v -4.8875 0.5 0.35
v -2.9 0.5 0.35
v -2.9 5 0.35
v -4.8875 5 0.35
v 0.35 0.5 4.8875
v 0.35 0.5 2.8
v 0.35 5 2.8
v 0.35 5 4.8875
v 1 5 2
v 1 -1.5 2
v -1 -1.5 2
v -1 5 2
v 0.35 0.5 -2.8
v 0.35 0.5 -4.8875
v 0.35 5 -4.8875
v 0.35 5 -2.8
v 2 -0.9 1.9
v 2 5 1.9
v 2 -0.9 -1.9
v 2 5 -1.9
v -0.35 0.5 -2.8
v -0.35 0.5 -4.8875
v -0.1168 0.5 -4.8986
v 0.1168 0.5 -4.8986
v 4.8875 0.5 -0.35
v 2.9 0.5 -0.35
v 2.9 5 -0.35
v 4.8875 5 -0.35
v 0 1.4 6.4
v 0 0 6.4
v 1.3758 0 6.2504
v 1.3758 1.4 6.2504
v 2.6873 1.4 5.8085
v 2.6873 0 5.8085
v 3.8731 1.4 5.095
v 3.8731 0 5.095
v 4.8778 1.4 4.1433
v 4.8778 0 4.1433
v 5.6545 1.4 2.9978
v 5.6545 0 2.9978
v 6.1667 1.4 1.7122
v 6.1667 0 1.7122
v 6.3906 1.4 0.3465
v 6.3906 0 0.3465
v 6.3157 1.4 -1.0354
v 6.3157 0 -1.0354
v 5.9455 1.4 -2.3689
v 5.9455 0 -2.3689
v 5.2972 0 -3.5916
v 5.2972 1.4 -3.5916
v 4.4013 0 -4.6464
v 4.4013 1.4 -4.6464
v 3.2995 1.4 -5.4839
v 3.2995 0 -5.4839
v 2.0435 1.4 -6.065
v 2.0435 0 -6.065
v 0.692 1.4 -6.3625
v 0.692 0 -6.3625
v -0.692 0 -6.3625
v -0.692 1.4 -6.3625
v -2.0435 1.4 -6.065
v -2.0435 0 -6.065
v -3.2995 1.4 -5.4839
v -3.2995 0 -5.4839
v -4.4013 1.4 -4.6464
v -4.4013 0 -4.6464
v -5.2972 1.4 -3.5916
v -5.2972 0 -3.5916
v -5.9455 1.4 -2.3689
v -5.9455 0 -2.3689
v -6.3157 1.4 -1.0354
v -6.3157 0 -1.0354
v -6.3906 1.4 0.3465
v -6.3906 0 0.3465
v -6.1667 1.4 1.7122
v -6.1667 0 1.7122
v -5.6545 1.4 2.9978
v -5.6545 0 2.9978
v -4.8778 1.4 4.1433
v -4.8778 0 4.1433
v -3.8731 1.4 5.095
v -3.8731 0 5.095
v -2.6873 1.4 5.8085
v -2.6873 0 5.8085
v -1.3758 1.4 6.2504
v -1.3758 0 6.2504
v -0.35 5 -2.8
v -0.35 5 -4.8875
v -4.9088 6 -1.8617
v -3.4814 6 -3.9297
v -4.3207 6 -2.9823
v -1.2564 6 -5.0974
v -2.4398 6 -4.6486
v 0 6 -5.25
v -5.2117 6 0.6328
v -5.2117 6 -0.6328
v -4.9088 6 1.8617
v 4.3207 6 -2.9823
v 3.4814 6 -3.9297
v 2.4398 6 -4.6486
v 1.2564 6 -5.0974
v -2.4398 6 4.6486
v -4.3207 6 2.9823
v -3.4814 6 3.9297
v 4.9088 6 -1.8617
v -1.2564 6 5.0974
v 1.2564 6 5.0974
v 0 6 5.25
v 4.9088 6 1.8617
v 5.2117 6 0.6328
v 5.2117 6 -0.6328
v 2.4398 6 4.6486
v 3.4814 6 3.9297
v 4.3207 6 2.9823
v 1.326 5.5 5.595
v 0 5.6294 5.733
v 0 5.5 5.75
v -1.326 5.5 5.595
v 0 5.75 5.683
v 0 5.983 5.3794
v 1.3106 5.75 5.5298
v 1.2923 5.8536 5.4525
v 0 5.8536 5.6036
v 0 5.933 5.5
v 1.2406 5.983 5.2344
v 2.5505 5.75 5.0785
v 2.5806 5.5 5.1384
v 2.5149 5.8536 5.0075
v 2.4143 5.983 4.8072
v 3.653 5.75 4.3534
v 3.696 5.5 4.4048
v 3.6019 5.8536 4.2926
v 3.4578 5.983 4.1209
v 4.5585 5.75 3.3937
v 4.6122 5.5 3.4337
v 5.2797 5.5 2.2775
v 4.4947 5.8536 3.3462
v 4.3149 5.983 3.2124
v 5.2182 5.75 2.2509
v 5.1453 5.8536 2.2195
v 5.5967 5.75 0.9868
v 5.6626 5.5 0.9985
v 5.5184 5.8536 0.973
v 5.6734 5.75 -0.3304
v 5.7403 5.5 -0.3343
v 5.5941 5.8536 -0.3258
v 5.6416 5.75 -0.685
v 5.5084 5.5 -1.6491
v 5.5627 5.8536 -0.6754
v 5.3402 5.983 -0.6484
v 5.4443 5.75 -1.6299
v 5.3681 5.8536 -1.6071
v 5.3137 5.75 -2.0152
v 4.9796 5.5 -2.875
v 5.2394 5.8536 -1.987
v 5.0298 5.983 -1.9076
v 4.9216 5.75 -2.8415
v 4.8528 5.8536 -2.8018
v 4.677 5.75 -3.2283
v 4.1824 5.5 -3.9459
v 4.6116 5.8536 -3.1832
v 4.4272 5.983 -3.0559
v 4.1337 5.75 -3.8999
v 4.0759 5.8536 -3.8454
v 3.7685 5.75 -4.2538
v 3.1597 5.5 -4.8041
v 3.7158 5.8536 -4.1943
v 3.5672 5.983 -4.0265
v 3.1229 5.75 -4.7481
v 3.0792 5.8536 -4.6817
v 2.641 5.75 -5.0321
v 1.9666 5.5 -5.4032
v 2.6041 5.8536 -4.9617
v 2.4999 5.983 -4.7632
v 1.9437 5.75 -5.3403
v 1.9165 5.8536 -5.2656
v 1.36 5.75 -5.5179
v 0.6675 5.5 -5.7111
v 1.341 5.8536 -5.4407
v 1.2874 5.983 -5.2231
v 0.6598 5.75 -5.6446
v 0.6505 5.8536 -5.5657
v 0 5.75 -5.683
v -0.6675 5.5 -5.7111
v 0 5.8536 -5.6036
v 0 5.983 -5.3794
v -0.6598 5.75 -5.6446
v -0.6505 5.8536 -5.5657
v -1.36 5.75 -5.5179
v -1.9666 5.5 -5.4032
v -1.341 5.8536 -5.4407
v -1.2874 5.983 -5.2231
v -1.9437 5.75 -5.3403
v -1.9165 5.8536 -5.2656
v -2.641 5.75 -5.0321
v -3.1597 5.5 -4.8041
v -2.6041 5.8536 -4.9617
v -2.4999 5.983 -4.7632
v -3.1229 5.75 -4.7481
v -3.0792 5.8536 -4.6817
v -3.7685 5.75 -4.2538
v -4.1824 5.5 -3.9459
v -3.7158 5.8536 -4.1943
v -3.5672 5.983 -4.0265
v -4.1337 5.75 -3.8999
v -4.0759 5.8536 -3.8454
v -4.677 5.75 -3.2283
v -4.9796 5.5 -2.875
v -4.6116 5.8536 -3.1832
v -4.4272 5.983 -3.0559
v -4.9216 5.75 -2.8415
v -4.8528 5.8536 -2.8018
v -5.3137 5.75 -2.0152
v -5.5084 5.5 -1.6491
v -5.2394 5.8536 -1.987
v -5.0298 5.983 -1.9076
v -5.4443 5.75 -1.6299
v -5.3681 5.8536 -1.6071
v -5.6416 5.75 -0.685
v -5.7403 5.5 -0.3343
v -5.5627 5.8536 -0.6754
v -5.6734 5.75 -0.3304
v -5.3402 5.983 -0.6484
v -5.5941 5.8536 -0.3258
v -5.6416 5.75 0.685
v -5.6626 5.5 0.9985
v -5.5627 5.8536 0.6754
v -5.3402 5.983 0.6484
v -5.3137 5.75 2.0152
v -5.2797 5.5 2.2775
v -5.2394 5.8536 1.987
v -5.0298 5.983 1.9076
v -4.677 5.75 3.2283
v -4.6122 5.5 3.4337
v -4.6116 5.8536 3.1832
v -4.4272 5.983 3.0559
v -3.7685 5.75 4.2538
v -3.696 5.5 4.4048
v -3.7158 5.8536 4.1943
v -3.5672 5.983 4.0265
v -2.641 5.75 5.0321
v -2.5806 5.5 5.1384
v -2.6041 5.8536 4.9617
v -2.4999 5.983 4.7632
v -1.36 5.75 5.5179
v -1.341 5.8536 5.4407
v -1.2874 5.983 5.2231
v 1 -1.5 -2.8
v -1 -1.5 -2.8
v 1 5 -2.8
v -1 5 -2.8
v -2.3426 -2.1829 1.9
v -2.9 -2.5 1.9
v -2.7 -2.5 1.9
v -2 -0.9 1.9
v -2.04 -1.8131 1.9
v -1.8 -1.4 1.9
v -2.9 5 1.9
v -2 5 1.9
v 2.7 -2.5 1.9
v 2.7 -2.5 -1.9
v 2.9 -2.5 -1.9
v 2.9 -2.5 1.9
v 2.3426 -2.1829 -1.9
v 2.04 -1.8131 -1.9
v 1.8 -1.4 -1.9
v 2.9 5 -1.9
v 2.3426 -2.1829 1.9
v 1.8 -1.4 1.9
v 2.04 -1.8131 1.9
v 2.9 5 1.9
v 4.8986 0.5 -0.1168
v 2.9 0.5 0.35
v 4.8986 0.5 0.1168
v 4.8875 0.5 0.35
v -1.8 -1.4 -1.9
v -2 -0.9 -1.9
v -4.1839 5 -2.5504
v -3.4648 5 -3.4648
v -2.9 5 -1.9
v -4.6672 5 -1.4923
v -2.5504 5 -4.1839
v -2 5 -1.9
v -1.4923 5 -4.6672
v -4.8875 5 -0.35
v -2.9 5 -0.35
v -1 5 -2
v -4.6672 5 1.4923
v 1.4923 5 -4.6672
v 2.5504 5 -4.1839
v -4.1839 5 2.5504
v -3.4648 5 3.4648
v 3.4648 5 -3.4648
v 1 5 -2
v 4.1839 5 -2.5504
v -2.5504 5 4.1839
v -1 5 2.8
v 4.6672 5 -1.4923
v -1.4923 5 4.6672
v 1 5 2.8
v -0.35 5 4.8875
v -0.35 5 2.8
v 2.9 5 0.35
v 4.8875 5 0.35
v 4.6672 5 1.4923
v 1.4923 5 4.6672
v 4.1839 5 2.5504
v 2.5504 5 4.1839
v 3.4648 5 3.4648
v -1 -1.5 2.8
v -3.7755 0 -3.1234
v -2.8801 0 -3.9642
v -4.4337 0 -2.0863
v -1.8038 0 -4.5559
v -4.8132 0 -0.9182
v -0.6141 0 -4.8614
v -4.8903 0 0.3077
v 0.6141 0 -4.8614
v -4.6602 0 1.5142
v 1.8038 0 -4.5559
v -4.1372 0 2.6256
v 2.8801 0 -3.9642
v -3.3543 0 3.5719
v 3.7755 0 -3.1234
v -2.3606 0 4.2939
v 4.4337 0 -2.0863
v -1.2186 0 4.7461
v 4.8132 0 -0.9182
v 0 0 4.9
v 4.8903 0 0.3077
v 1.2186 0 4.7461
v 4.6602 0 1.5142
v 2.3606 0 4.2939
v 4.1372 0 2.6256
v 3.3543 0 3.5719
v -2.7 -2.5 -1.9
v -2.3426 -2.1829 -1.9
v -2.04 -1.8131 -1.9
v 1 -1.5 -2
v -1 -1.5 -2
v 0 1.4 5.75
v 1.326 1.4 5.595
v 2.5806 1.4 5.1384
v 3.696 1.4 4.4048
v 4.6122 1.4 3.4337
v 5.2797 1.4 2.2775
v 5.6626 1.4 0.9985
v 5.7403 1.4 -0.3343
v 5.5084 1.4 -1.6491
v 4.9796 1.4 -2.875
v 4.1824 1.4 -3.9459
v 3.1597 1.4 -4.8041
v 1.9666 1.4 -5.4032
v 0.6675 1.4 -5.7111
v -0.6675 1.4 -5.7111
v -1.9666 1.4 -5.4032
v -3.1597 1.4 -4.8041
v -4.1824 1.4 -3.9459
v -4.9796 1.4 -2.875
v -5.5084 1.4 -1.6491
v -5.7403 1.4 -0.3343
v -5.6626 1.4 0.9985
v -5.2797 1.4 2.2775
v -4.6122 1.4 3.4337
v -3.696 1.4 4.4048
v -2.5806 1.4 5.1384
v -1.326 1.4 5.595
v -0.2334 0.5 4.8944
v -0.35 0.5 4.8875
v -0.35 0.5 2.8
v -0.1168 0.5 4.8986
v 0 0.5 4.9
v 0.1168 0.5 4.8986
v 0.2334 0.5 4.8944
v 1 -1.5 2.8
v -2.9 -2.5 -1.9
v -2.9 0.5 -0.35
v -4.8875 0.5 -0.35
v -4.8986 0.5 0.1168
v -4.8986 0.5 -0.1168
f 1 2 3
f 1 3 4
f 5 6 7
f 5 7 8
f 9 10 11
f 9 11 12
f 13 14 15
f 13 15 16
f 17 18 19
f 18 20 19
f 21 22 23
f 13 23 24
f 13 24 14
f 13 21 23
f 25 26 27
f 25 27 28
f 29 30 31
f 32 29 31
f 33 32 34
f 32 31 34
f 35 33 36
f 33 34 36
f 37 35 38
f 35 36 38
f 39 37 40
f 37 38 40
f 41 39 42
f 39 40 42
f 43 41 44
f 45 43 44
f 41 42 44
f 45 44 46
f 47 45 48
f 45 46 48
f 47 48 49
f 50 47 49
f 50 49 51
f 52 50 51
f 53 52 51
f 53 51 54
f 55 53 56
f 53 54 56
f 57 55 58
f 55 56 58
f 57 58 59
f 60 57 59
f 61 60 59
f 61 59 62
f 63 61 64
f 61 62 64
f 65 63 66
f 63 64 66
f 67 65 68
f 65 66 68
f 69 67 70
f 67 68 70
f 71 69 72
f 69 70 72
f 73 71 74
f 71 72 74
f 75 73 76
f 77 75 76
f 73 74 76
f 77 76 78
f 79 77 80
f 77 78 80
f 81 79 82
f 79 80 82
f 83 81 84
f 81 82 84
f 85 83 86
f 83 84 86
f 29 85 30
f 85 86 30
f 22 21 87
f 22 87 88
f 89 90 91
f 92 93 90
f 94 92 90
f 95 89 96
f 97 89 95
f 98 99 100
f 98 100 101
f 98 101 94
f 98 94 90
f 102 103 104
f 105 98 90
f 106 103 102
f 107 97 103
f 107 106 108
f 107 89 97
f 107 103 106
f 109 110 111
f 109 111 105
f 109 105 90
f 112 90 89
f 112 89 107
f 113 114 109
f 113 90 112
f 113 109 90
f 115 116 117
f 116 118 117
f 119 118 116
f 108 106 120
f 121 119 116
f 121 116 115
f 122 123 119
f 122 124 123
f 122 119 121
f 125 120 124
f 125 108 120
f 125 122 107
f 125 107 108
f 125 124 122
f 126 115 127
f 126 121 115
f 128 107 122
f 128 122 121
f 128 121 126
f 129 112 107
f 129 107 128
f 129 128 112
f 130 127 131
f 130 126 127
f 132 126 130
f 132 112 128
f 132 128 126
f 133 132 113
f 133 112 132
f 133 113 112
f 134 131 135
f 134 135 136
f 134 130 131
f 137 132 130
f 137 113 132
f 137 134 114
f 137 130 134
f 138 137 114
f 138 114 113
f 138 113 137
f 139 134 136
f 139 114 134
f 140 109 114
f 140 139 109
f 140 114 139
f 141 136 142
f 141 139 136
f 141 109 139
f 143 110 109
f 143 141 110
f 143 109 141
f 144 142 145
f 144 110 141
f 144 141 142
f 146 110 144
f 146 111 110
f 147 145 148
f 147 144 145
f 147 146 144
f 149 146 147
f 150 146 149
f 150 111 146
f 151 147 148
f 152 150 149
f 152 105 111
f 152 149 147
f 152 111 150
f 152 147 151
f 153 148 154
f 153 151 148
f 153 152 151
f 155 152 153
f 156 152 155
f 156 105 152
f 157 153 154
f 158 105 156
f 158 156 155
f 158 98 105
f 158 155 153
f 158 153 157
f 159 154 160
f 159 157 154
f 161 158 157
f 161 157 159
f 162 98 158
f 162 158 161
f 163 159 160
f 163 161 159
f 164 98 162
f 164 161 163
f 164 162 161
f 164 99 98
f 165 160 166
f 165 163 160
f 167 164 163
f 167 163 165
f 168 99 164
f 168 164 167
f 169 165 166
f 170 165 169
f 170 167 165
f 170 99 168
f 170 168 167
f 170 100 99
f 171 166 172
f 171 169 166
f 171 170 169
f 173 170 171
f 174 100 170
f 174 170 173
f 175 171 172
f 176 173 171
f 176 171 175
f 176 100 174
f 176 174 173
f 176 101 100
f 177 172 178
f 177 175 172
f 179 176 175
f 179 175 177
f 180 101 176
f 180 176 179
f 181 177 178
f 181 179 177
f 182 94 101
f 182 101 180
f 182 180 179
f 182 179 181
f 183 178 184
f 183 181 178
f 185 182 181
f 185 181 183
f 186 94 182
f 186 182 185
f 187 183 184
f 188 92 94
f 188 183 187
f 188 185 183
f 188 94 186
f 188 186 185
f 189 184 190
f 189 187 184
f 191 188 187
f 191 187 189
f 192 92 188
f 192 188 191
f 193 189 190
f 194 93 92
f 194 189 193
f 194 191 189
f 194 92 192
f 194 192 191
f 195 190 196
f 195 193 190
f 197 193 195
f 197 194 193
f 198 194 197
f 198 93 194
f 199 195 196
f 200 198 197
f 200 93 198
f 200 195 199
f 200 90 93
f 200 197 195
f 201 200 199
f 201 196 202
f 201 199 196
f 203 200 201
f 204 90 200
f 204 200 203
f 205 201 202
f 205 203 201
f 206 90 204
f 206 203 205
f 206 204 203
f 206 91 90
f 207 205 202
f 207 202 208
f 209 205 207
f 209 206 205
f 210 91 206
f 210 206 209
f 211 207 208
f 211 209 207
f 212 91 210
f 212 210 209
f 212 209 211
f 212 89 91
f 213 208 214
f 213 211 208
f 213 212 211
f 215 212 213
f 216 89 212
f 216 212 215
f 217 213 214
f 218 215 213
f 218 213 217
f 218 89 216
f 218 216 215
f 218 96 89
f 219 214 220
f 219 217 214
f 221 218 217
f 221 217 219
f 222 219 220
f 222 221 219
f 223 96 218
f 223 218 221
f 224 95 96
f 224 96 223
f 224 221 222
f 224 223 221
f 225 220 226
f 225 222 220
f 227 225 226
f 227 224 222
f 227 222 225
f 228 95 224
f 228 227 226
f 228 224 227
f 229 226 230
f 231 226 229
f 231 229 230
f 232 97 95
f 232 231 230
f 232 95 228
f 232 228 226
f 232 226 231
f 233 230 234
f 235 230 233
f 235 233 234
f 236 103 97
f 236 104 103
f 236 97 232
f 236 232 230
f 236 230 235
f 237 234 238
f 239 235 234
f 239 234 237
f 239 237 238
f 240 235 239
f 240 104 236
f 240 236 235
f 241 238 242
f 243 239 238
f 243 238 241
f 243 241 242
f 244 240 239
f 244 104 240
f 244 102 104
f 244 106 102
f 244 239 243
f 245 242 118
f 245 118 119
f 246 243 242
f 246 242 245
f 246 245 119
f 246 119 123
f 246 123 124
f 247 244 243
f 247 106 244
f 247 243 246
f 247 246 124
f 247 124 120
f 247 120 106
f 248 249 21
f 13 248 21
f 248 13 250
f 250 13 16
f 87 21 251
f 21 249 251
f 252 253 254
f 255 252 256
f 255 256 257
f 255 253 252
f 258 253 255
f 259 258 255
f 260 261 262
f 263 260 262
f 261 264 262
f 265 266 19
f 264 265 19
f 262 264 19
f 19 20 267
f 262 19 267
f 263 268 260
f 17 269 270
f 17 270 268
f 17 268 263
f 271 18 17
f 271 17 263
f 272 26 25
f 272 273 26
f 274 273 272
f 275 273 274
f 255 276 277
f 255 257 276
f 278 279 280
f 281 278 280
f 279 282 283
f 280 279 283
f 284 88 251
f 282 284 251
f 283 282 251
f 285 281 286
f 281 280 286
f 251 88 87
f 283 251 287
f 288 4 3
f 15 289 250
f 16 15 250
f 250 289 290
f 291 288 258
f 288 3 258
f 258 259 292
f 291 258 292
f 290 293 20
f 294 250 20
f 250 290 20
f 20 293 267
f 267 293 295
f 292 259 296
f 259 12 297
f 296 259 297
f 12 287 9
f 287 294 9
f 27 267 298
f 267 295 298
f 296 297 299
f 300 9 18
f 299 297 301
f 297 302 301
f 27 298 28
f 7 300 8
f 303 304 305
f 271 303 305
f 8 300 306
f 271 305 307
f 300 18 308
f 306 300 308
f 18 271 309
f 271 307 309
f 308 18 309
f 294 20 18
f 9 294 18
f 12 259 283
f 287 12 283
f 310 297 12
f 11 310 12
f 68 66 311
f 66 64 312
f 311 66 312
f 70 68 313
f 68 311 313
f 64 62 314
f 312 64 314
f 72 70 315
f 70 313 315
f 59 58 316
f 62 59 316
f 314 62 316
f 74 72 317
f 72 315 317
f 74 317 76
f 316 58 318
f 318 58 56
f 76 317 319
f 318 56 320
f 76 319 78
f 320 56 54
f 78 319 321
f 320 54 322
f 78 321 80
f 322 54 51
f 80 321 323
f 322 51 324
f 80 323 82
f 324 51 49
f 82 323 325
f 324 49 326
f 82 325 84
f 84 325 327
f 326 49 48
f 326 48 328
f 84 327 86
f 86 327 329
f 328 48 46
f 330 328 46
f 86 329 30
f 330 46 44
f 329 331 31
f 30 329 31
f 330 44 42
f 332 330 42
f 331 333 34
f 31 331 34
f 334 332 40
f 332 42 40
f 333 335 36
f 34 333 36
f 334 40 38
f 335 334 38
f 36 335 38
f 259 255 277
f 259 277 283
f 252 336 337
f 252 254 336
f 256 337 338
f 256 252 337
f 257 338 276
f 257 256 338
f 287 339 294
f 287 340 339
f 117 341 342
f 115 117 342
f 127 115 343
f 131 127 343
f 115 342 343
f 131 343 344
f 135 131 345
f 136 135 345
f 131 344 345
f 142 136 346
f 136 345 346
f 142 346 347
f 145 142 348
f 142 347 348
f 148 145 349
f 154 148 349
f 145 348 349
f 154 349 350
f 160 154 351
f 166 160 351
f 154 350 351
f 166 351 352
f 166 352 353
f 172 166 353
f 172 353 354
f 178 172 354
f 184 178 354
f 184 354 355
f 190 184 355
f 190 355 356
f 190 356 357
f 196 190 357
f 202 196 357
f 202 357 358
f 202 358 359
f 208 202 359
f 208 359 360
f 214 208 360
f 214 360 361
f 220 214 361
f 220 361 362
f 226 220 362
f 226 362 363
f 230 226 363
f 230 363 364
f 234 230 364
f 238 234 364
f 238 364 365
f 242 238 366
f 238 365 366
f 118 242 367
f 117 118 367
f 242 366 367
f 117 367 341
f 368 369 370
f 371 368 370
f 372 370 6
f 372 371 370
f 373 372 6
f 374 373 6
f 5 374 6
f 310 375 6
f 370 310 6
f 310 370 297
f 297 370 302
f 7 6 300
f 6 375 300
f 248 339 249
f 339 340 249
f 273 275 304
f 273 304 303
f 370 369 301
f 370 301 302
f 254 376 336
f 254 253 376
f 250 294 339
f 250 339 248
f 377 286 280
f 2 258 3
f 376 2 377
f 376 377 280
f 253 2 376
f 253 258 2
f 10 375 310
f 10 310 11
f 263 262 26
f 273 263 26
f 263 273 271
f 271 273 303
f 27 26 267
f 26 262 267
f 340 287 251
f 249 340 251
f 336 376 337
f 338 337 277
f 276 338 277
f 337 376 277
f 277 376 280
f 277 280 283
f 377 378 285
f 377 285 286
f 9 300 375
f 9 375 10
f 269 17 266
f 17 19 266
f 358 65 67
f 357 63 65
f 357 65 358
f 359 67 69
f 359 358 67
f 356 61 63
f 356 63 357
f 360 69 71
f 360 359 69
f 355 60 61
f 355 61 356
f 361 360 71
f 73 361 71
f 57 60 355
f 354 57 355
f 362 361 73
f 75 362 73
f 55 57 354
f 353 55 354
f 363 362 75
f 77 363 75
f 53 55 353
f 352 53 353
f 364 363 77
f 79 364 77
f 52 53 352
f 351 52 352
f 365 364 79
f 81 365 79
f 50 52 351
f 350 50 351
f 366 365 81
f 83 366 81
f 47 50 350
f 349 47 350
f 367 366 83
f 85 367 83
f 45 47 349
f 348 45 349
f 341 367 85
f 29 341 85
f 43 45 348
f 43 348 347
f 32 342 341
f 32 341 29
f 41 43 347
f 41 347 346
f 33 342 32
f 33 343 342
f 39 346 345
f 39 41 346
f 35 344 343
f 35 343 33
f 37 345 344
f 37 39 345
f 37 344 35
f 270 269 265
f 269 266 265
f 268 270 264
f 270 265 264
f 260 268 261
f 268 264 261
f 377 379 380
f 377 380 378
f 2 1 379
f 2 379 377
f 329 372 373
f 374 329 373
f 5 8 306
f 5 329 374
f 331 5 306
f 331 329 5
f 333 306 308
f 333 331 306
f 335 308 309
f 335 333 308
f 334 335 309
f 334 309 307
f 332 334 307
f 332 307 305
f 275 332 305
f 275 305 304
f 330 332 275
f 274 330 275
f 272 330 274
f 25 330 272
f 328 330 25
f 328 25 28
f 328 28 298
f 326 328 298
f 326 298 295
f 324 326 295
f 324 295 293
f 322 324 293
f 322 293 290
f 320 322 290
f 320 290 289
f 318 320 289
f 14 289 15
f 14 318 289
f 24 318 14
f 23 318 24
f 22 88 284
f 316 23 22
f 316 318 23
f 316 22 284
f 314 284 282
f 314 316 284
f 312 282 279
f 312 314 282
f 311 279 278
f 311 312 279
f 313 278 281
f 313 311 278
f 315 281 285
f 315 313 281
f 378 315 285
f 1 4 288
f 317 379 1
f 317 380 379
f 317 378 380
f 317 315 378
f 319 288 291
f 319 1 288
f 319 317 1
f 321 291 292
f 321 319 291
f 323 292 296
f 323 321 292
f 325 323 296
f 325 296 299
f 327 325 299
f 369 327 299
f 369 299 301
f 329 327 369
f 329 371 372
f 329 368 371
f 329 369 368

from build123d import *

# Parameters (mm, degrees)
SKETCH1_R           = 5.75
BOSS_EXTRUDE1_DEPTH = 6
SKETCH2_R           = 6.4
BOSS_EXTRUDE2_DEPTH = 1.4
SKETCH3_R           = 4.9
CUT_EXTRUDE1_DEPTH  = 5
SKETCH4_W           = 0.8
SKETCH4_H           = 6.5
BOSS_EXTRUDE3_DEPTH = 1
BOSS_EXTRUDE4_DEPTH = 1.9
BOSS_EXTRUDE5_START = 4.5
BOSS_EXTRUDE5_DEPTH = 4.5
FILLET1_R           = 0.5


with BuildPart() as part:
    # Sketch1 → Boss-Extrude1 (new body)
    with BuildSketch(Plane(origin=(0, 0, 0), x_dir=(1, 0, 0), z_dir=(0, 1, 0))):
        with Locations(Location((0, 0, 0), (0, 0, 270))):
            Circle(SKETCH1_R)
    extrude(amount=BOSS_EXTRUDE1_DEPTH)

    # Sketch2 → Boss-Extrude2 (add)
    with BuildSketch(Plane(origin=(0, 0, 0), x_dir=(1, 0, 0), z_dir=(0, 1, 0))):
        with Locations(Location((0, 0, 0), (0, 0, 270))):
            Circle(SKETCH2_R)
    extrude(amount=BOSS_EXTRUDE2_DEPTH)

    # Sketch3 → Cut-Extrude1 (cut)
    with BuildSketch(Plane(origin=(0, 0, 0), x_dir=(1, 0, 0), z_dir=(0, 1, 0))):
        with Locations(Location((0, 0, 0), (0, 0, 270))):
            Circle(SKETCH3_R)
    extrude(amount=CUT_EXTRUDE1_DEPTH, mode=Mode.SUBTRACT)

    # Sketch4 → Boss-Extrude3 (add, symmetric)
    with BuildSketch(Plane(origin=(0, 0, 0), x_dir=(0, 0, -1), z_dir=(1, 0, 0))):
        with Locations((2.4, 1.75)):
            Rectangle(SKETCH4_W, SKETCH4_H)
        with Locations((-2.4, 1.75)):
            Rectangle(SKETCH4_W, SKETCH4_H)
    extrude(amount=BOSS_EXTRUDE3_DEPTH, both=True)

    # Sketch5 → Boss-Extrude4 (add, symmetric)
    with BuildSketch(Plane.XY):
        with BuildLine():
            Line((2.9, 5), (2, 5))
            Line((2, 5), (2, -0.9))
            Line((2, -0.9), (1.8, -1.4))
            ThreePointArc((1.8, -1.4), (2.183918232, -2.004066901), (2.7, -2.5))
            Line((2.7, -2.5), (2.9, -2.5))
            Line((2.9, -2.5), (2.9, 5))
        make_face()
        with BuildLine():
            Line((-1.8, -1.4), (-2, -0.9))
            Line((-2, -0.9), (-2, 5))
            Line((-2, 5), (-2.9, 5))
            Line((-2.9, 5), (-2.9, -2.5))
            Line((-2.9, -2.5), (-2.7, -2.5))
            ThreePointArc((-2.7, -2.5), (-2.183918232, -2.004066901), (-1.8, -1.4))
        make_face()
    extrude(amount=BOSS_EXTRUDE4_DEPTH, both=True)

    # Sketch6 → Boss-Extrude5 (add)
    with BuildSketch(Plane.XZ.offset(-5).offset(BOSS_EXTRUDE5_START)):
        with BuildLine():
            Line((-2.9, 0.35), (-4.887484015, 0.35))
            ThreePointArc((-4.887484015, 0.35), (-4.9, 0), (-4.887484015, -0.35))
            Line((-4.887484015, -0.35), (-2.9, -0.35))
            Line((-2.9, -0.35), (-2.9, 0.35))
        make_face()
        with BuildLine():
            Line((0.35, 2.8), (0.35, 4.887484015))
            ThreePointArc((0.35, 4.887484015), (0, 4.9), (-0.35, 4.887484015))
            Line((-0.35, 4.887484015), (-0.35, 2.8))
            Line((-0.35, 2.8), (0.35, 2.8))
        make_face()
        with BuildLine():
            Line((2.9, -0.35), (4.887484015, -0.35))
            ThreePointArc((4.887484015, -0.35), (4.9, 0), (4.887484015, 0.35))
            Line((4.887484015, 0.35), (2.9, 0.35))
            Line((2.9, 0.35), (2.9, -0.35))
        make_face()
        with BuildLine():
            Line((-0.35, -2.8), (-0.35, -4.887484015))
            ThreePointArc((-0.35, -4.887484015), (0, -4.9), (0.35, -4.887484015))
            Line((0.35, -4.887484015), (0.35, -2.8))
            Line((0.35, -2.8), (-0.35, -2.8))
        make_face()
    extrude(amount=-BOSS_EXTRUDE5_DEPTH)

    # Fillet1
    fillet1_edges = [part.edges().sort_by_distance(p)[0] for p in [
        (0, 6, -5.75),
    ]]
    fillet(fillet1_edges, radius=FILLET1_R)


solid = part.part
